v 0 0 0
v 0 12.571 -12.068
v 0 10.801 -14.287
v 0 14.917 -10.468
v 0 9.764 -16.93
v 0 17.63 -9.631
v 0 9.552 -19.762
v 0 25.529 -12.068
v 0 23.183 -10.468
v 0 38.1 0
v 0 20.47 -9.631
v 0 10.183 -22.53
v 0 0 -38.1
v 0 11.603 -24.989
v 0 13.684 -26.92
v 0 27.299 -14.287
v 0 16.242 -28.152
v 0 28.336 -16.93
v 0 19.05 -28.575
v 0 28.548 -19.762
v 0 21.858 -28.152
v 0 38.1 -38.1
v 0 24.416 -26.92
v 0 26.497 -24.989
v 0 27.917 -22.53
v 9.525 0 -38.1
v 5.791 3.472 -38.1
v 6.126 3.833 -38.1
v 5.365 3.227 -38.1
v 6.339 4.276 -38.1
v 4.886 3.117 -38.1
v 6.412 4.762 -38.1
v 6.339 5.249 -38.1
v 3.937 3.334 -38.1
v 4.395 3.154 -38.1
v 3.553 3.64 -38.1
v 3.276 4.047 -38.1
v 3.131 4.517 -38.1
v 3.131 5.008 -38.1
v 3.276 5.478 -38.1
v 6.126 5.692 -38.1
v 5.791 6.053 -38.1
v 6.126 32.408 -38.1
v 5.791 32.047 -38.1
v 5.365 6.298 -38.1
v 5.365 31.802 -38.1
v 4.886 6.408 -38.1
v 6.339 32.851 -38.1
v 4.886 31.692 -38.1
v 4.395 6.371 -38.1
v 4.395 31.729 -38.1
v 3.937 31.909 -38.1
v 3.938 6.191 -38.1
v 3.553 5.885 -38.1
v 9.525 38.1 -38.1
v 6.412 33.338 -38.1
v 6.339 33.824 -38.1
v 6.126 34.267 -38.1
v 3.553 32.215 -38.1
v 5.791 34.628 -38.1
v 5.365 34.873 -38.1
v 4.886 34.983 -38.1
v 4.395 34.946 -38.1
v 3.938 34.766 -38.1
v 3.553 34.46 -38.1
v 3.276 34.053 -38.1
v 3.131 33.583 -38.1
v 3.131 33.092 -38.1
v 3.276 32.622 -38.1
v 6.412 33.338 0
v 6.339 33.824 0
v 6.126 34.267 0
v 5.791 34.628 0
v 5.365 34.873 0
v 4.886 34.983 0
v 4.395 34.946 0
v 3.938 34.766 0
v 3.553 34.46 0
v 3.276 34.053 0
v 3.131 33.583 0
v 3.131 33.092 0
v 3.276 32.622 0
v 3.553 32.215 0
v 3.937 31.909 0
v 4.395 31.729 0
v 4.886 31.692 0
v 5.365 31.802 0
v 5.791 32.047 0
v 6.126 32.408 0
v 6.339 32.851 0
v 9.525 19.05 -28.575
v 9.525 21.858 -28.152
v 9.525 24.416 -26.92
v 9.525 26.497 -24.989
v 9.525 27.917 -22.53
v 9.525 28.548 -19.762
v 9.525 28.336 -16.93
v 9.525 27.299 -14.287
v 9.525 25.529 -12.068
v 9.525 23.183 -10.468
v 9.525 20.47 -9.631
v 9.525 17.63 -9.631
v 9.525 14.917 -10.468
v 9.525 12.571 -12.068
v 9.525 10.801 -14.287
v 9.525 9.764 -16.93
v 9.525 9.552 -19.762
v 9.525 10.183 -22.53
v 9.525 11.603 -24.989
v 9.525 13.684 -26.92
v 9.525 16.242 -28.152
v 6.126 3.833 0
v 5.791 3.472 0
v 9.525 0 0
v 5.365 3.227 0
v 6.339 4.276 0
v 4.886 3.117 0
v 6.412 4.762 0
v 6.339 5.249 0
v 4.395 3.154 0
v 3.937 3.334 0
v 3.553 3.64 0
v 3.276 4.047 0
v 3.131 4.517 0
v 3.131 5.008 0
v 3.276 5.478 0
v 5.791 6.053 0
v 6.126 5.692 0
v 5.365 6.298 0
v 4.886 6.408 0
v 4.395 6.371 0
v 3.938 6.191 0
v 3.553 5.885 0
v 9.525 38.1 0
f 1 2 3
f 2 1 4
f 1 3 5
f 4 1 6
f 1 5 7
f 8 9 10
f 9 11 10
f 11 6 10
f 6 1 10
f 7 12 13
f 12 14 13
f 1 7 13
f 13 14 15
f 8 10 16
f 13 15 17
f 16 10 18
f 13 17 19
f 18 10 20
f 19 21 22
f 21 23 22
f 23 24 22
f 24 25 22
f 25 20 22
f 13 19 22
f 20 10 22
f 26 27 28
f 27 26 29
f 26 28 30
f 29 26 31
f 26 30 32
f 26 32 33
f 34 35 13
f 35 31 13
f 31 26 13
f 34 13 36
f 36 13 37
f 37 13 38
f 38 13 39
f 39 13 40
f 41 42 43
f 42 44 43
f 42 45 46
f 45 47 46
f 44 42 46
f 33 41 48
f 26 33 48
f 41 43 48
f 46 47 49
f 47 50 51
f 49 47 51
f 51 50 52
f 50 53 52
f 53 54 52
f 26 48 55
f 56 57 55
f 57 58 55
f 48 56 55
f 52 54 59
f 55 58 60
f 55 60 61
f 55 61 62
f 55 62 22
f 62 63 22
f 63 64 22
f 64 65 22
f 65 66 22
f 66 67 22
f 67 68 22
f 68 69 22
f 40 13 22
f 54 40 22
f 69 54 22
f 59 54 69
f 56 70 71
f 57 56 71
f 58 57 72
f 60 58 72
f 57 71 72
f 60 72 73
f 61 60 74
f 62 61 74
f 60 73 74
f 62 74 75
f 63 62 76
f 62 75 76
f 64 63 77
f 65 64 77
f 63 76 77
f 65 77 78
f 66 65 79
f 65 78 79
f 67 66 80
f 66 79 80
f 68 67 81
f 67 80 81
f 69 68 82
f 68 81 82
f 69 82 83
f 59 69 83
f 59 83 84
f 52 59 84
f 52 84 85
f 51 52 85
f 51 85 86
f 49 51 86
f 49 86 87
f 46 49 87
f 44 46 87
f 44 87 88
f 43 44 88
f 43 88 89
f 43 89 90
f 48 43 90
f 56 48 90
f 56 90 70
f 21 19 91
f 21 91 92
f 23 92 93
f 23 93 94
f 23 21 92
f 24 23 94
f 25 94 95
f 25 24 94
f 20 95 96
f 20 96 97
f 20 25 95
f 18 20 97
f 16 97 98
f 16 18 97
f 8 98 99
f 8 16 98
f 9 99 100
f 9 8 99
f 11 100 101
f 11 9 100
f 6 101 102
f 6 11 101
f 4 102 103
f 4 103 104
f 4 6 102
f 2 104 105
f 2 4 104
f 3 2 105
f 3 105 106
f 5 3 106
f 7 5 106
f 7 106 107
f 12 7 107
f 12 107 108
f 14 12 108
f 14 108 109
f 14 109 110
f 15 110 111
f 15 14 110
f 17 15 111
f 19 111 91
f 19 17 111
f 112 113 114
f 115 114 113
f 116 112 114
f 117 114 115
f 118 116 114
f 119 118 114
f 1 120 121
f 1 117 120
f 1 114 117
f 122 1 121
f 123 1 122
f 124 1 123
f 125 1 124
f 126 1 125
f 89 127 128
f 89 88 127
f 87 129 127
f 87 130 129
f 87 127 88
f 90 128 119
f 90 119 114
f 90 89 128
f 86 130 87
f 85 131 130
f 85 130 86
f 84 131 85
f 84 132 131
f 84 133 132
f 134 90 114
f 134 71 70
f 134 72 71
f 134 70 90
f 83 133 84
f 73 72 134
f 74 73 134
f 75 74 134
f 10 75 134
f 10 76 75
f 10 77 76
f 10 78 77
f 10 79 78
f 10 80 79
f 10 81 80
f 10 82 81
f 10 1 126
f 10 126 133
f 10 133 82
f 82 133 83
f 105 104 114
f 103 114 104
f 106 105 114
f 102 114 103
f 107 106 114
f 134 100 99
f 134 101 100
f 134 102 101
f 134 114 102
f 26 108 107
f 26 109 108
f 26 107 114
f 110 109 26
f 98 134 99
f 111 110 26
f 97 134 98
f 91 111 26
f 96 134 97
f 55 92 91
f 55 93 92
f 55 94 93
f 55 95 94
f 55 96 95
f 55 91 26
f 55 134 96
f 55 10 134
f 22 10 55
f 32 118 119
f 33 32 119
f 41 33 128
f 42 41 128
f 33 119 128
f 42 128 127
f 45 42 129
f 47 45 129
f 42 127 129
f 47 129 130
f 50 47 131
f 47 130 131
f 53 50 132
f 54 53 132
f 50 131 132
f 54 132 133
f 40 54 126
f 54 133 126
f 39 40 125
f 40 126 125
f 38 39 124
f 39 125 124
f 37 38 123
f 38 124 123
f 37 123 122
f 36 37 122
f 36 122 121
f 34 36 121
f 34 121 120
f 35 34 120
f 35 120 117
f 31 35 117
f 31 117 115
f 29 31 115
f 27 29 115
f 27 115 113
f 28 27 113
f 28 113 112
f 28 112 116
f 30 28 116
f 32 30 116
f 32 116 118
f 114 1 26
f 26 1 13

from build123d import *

# Parameters (mm, degrees)
SKETCH2_W             = 38.1
SKETCH2_H             = 38.1
SKETCH2_R             = 9.525
BOSS_EXTRUDE1_DEPTH   = 9.525
M4X0_7_TAPPED_HOLE1_D = 3.3


with BuildPart() as part:
    # Sketch2 → Boss-Extrude1 (new body)
    with BuildSketch(Plane(origin=(0, 0, 0), x_dir=(0, 0, -1), z_dir=(1, 0, 0))):
        with Locations((19.05, 19.05)):
            Rectangle(SKETCH2_W, SKETCH2_H)
        with Locations((19.05, 19.05)):
            Circle(SKETCH2_R, mode=Mode.SUBTRACT)
    extrude(amount=BOSS_EXTRUDE1_DEPTH)

    # M4x0.7 Tapped Hole1 (through all)
    with Locations(Plane(origin=(0, 0, -38.1), x_dir=(-1, 0, 0), z_dir=(0, 0, -1))):
        with Locations((-4.7625, 33.3375), (-4.7625, 4.7625)):
            Hole(M4X0_7_TAPPED_HOLE1_D / 2)


solid = part.part
